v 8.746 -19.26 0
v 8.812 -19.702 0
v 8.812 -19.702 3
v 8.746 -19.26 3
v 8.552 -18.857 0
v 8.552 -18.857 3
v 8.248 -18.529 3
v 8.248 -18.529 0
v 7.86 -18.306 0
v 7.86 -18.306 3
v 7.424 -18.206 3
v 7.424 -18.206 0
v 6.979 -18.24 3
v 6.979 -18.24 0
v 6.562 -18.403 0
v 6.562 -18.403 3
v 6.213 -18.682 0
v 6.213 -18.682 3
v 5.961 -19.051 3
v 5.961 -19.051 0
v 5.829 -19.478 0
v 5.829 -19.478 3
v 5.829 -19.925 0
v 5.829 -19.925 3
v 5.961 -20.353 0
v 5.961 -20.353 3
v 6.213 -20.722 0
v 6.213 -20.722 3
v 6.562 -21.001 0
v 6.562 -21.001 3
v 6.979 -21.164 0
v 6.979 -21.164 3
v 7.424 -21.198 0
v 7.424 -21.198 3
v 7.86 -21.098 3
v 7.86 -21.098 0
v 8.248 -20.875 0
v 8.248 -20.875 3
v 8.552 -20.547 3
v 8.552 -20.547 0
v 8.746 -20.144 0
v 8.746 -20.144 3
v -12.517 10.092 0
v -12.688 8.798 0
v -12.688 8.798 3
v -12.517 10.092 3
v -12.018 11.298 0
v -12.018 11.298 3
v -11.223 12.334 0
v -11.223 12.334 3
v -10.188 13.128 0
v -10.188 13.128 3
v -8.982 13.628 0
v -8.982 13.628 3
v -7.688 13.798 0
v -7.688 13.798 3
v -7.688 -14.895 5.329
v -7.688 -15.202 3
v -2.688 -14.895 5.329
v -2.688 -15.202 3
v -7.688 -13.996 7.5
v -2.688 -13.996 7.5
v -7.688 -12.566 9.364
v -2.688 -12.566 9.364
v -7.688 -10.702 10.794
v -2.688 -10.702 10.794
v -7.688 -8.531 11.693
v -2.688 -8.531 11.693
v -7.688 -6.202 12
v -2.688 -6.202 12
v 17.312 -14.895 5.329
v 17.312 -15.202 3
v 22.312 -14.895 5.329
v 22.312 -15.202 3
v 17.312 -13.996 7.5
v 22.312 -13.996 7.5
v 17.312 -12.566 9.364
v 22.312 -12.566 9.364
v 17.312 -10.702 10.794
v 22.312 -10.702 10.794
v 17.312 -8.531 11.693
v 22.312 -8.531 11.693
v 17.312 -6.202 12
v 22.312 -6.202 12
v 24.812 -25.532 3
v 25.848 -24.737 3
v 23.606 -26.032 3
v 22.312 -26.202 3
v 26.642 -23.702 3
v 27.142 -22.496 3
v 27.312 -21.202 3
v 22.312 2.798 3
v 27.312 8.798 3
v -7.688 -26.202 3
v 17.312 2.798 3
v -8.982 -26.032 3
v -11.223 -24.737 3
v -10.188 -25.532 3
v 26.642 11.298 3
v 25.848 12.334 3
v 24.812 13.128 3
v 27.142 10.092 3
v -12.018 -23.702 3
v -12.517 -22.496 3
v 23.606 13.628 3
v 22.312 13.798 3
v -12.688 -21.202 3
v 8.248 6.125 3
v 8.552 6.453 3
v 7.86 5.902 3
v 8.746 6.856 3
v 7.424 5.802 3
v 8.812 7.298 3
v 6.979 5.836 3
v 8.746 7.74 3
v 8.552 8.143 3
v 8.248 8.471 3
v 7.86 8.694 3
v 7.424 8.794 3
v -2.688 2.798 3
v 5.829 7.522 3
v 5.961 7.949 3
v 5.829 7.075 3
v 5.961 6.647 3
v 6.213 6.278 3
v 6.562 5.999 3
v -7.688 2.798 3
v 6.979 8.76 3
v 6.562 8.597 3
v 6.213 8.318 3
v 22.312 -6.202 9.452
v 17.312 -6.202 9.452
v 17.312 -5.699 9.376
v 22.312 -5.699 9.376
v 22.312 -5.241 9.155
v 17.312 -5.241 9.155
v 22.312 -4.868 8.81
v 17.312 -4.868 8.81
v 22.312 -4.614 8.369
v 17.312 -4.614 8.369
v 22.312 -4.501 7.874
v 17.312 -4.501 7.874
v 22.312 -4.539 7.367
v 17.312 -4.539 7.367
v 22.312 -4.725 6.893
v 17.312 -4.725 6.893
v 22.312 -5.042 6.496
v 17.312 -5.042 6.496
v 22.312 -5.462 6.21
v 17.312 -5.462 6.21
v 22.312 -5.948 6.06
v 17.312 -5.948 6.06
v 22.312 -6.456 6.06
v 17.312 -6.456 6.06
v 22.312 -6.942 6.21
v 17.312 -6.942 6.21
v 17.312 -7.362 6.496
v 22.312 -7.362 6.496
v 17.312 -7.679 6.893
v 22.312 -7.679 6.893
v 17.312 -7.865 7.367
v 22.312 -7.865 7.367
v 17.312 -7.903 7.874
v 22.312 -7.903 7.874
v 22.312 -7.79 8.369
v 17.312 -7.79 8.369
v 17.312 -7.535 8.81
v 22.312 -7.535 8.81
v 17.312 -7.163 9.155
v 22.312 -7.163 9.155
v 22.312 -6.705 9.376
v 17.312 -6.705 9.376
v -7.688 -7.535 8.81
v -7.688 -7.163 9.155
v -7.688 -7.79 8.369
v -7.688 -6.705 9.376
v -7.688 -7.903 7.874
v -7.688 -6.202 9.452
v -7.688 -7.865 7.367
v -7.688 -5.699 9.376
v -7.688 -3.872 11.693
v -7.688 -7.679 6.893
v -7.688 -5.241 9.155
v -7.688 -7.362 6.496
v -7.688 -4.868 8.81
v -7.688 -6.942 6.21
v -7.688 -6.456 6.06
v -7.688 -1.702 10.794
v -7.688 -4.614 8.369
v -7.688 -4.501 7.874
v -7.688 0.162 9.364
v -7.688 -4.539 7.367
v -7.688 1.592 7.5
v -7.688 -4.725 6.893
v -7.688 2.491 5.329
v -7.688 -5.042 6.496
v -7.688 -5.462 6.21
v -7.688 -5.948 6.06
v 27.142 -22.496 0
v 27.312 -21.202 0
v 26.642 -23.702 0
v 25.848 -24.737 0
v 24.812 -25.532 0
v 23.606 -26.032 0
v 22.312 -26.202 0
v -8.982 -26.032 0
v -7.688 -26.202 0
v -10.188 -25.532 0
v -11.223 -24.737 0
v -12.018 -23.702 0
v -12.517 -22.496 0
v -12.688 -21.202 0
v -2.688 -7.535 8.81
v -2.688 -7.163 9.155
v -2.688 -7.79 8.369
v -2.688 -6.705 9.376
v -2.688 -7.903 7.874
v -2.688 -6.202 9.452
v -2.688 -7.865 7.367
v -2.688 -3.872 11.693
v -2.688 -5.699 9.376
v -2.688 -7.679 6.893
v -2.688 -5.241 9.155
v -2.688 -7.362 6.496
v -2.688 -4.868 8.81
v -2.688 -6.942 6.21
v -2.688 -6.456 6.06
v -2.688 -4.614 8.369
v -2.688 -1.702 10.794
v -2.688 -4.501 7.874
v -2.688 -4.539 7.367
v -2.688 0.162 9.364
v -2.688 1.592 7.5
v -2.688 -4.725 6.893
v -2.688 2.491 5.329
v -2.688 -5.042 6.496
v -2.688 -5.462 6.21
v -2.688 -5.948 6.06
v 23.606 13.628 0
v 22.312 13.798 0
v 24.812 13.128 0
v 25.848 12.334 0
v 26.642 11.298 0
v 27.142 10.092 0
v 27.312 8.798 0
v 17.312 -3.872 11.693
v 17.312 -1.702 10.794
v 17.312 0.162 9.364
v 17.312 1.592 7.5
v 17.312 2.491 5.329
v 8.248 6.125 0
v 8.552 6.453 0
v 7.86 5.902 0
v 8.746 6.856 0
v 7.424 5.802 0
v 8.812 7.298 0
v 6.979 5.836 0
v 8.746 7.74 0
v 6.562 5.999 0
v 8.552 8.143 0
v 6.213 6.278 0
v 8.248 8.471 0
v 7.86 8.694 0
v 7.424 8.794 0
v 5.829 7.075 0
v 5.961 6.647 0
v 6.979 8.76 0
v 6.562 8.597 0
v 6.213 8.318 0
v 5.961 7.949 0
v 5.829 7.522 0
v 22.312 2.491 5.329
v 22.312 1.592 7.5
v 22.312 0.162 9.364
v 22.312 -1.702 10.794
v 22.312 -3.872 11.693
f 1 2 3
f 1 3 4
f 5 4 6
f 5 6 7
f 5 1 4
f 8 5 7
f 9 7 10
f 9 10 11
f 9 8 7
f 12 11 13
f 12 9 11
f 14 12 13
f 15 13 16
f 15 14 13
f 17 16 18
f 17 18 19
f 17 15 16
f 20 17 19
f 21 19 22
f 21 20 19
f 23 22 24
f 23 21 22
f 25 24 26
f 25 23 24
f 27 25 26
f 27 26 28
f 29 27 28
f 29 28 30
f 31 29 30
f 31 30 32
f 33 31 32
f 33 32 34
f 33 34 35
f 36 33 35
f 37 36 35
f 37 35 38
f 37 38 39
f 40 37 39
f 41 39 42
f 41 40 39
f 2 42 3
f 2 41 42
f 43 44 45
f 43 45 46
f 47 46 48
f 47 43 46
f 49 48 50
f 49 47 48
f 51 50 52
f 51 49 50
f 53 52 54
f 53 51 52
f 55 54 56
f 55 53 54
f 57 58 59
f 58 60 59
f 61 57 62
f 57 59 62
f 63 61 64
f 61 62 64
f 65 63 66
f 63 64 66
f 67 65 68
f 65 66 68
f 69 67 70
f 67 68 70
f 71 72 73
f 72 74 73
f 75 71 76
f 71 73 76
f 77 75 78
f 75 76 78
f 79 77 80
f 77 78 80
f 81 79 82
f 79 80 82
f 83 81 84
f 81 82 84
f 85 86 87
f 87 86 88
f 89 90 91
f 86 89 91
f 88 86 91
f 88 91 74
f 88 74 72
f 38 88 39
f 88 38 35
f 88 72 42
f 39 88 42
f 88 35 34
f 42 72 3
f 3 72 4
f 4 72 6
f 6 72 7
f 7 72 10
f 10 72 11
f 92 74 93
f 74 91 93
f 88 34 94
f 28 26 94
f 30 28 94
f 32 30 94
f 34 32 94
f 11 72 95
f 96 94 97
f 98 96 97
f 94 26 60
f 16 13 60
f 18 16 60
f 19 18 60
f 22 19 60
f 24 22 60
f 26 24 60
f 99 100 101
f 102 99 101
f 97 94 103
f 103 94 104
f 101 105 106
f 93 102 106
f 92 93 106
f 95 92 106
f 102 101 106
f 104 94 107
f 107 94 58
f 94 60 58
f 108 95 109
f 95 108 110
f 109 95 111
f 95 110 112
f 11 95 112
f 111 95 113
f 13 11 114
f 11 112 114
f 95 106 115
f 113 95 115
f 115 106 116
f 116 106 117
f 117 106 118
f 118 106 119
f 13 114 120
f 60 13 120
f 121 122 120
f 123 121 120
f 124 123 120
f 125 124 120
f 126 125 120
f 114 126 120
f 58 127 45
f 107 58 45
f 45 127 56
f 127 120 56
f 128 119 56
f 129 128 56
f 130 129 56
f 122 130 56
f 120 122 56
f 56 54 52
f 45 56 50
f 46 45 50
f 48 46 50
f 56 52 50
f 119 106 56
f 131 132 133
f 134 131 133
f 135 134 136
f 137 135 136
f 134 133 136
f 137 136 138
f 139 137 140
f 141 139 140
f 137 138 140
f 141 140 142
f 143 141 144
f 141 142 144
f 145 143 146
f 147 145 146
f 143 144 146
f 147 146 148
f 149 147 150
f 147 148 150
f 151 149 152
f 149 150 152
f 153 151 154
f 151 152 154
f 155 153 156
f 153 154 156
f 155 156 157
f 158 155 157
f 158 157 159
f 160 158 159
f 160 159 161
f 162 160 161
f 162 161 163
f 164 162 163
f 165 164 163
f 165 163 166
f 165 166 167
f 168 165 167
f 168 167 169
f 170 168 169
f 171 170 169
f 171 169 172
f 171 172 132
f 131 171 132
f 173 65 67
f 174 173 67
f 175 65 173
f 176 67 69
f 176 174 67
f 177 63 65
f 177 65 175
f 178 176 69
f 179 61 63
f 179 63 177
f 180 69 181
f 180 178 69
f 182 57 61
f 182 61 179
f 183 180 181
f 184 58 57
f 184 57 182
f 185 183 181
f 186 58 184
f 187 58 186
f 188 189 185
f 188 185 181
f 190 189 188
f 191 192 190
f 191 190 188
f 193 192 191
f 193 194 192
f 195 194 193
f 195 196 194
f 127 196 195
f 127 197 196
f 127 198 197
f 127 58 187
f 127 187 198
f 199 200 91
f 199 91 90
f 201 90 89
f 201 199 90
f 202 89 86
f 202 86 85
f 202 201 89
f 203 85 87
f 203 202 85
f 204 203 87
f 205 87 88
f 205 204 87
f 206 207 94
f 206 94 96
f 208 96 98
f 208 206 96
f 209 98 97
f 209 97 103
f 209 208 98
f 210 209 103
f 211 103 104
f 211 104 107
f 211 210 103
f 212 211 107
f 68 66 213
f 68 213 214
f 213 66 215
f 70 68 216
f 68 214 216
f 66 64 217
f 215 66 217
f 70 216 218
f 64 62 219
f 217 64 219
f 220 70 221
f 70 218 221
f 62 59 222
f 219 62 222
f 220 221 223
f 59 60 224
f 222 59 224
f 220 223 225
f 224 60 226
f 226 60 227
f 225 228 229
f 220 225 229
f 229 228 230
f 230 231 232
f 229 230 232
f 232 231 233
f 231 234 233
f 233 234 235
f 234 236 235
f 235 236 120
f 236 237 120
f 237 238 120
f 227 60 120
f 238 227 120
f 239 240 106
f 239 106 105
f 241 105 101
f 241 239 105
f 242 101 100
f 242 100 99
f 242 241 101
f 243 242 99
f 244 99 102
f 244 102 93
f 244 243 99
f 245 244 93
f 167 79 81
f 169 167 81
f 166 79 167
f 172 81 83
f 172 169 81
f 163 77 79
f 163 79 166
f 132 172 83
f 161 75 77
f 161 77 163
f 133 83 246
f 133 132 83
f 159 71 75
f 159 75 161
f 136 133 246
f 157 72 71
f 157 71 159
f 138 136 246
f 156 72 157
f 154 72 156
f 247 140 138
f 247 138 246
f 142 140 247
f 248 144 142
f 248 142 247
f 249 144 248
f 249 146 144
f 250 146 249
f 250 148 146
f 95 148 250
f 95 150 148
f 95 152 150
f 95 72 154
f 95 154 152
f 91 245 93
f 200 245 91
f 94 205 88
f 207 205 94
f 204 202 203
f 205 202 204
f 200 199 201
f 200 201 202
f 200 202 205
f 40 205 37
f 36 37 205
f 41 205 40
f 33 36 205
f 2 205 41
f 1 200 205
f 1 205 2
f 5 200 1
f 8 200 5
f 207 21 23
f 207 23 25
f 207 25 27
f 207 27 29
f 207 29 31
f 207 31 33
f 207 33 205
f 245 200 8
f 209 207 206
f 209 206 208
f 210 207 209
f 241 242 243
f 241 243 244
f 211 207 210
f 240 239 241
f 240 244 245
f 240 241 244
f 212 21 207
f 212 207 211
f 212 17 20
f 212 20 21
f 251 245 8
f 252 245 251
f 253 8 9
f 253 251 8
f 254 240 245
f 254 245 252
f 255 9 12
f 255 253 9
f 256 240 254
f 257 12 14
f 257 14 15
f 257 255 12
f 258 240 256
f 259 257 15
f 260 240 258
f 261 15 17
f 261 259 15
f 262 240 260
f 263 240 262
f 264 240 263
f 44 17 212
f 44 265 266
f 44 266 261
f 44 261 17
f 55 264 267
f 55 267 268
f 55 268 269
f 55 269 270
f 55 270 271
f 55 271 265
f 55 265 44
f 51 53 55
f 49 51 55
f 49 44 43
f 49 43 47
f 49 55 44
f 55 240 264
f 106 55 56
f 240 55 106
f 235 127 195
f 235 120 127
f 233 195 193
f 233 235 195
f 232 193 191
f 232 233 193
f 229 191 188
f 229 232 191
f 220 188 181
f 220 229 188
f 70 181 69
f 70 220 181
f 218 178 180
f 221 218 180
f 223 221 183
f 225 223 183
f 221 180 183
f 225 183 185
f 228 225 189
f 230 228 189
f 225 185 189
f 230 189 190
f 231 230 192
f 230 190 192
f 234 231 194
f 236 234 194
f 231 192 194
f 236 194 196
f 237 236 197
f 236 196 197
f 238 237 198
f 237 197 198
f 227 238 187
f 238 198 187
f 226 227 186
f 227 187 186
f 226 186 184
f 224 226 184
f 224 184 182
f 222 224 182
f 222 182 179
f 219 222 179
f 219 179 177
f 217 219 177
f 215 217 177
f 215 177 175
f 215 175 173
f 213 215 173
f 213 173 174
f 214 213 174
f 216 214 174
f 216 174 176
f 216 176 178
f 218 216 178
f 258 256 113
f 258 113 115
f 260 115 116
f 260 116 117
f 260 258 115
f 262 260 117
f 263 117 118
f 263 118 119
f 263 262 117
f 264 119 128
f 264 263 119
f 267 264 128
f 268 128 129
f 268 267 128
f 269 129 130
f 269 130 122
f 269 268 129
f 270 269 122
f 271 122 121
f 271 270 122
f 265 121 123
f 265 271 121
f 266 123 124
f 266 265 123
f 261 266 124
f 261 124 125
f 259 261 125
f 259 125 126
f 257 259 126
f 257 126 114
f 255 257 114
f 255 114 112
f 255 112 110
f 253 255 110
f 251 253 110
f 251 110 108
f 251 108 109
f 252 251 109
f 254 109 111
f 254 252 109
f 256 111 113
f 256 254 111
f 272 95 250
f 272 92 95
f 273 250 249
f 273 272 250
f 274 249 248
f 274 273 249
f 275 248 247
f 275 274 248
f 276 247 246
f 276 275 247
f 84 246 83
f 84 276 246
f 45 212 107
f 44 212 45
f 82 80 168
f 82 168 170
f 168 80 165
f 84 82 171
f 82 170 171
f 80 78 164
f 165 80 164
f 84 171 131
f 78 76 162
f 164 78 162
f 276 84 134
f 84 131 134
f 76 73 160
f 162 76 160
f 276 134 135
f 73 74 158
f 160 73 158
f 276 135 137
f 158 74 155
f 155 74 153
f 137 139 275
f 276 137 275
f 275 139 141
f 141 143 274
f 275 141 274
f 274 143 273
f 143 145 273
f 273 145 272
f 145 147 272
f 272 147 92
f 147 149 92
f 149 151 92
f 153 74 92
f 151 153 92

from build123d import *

# Parameters (mm, degrees)
CROQUIS1_R              = 1.5
SALIENTE_EXTRUIR1_DEPTH = 3
SALIENTE_EXTRUIR2_START = 3
CROQUIS2_W              = 5
CROQUIS2_H              = 18
SALIENTE_EXTRUIR2_DEPTH = 9
REDONDEO6_R             = 9
REDONDEO7_R             = 9
CORTAR_EXTRUIR1_REACH   = 47.338
CROQUIS3_R              = 1.705559653


with BuildPart() as part:
    # Croquis1 → Saliente-Extruir1 (new body)
    with BuildSketch(Plane.XY):
        with BuildLine():
            Line((-7.68763367, 13.798076923), (22.31236633, 13.798076923))
            ThreePointArc((22.31236633, 13.798076923), (25.847900236, 12.333610829), (27.31236633, 8.798076923))
            Line((27.31236633, 8.798076923), (27.31236633, -21.201923077))
            ThreePointArc((27.31236633, -21.201923077), (25.847900236, -24.737456983), (22.31236633, -26.201923077))
            Line((22.31236633, -26.201923077), (-7.68763367, -26.201923077))
            ThreePointArc((-7.68763367, -26.201923077), (-11.223167576, -24.737456983), (-12.68763367, -21.201923077))
            Line((-12.68763367, -21.201923077), (-12.68763367, 8.798076923))
            ThreePointArc((-12.68763367, 8.798076923), (-11.223167576, 12.333610829), (-7.68763367, 13.798076923))
        make_face()
        with Locations((7.31236633, 7.298076923)):
            Circle(CROQUIS1_R, mode=Mode.SUBTRACT)
        with Locations((7.31236633, -19.701923077)):
            Circle(CROQUIS1_R, mode=Mode.SUBTRACT)
    extrude(amount=SALIENTE_EXTRUIR1_DEPTH)

    # Croquis2 → Saliente-Extruir2 (add)
    with BuildSketch(Plane.XY.offset(SALIENTE_EXTRUIR2_START)):
        with Locations((-5.18763367, -6.201923077)):
            Rectangle(CROQUIS2_W, CROQUIS2_H)
        with Locations((19.81236633, -6.201923077)):
            Rectangle(CROQUIS2_W, CROQUIS2_H)
    extrude(amount=SALIENTE_EXTRUIR2_DEPTH)

    # Redondeo6
    redondeo6_edges = [part.edges().sort_by_distance(p)[0] for p in [
        (-5.18763367, 2.798076923, 12),
        (-5.18763367, -15.201923077, 12),
    ]]
    fillet(redondeo6_edges, radius=REDONDEO6_R - 0.0001)  # a hair under: the kernel refuses the full size

    # Redondeo7
    redondeo7_edges = [part.edges().sort_by_distance(p)[0] for p in [
        (19.81236633, -15.201923077, 12),
        (19.81236633, 2.798076923, 12),
    ]]
    fillet(redondeo7_edges, radius=REDONDEO7_R - 0.0001)  # a hair under: the kernel refuses the full size

    # Cortar-Extruir1: up to this face of the body (flat: up to its plane)
    cortar_extruir1_end = Plane(part.part.faces().sort_by_distance((22.31236633, -6.201923077, 6.819731779))[0])
    # Croquis3 → Cortar-Extruir1 (cut, up to the picked face)
    with BuildSketch(Plane.ZY.offset(7.68763367), mode=Mode.PRIVATE) as cortar_extruir1_sk1:
        with Locations((7.74625312, -6.201923077)):
            Circle(CROQUIS3_R)
    cortar_extruir1_tool1 = split(extrude(cortar_extruir1_sk1.sketch, amount=-CORTAR_EXTRUIR1_REACH, mode=Mode.PRIVATE), bisect_by=cortar_extruir1_end, keep=Keep.BOTH, mode=Mode.PRIVATE)
    add(cortar_extruir1_tool1.solids().sort_by(Axis((-7.687634, -6.201923, 7.746253), (1, 0, 0)))[0], mode=Mode.SUBTRACT)


solid = part.part
